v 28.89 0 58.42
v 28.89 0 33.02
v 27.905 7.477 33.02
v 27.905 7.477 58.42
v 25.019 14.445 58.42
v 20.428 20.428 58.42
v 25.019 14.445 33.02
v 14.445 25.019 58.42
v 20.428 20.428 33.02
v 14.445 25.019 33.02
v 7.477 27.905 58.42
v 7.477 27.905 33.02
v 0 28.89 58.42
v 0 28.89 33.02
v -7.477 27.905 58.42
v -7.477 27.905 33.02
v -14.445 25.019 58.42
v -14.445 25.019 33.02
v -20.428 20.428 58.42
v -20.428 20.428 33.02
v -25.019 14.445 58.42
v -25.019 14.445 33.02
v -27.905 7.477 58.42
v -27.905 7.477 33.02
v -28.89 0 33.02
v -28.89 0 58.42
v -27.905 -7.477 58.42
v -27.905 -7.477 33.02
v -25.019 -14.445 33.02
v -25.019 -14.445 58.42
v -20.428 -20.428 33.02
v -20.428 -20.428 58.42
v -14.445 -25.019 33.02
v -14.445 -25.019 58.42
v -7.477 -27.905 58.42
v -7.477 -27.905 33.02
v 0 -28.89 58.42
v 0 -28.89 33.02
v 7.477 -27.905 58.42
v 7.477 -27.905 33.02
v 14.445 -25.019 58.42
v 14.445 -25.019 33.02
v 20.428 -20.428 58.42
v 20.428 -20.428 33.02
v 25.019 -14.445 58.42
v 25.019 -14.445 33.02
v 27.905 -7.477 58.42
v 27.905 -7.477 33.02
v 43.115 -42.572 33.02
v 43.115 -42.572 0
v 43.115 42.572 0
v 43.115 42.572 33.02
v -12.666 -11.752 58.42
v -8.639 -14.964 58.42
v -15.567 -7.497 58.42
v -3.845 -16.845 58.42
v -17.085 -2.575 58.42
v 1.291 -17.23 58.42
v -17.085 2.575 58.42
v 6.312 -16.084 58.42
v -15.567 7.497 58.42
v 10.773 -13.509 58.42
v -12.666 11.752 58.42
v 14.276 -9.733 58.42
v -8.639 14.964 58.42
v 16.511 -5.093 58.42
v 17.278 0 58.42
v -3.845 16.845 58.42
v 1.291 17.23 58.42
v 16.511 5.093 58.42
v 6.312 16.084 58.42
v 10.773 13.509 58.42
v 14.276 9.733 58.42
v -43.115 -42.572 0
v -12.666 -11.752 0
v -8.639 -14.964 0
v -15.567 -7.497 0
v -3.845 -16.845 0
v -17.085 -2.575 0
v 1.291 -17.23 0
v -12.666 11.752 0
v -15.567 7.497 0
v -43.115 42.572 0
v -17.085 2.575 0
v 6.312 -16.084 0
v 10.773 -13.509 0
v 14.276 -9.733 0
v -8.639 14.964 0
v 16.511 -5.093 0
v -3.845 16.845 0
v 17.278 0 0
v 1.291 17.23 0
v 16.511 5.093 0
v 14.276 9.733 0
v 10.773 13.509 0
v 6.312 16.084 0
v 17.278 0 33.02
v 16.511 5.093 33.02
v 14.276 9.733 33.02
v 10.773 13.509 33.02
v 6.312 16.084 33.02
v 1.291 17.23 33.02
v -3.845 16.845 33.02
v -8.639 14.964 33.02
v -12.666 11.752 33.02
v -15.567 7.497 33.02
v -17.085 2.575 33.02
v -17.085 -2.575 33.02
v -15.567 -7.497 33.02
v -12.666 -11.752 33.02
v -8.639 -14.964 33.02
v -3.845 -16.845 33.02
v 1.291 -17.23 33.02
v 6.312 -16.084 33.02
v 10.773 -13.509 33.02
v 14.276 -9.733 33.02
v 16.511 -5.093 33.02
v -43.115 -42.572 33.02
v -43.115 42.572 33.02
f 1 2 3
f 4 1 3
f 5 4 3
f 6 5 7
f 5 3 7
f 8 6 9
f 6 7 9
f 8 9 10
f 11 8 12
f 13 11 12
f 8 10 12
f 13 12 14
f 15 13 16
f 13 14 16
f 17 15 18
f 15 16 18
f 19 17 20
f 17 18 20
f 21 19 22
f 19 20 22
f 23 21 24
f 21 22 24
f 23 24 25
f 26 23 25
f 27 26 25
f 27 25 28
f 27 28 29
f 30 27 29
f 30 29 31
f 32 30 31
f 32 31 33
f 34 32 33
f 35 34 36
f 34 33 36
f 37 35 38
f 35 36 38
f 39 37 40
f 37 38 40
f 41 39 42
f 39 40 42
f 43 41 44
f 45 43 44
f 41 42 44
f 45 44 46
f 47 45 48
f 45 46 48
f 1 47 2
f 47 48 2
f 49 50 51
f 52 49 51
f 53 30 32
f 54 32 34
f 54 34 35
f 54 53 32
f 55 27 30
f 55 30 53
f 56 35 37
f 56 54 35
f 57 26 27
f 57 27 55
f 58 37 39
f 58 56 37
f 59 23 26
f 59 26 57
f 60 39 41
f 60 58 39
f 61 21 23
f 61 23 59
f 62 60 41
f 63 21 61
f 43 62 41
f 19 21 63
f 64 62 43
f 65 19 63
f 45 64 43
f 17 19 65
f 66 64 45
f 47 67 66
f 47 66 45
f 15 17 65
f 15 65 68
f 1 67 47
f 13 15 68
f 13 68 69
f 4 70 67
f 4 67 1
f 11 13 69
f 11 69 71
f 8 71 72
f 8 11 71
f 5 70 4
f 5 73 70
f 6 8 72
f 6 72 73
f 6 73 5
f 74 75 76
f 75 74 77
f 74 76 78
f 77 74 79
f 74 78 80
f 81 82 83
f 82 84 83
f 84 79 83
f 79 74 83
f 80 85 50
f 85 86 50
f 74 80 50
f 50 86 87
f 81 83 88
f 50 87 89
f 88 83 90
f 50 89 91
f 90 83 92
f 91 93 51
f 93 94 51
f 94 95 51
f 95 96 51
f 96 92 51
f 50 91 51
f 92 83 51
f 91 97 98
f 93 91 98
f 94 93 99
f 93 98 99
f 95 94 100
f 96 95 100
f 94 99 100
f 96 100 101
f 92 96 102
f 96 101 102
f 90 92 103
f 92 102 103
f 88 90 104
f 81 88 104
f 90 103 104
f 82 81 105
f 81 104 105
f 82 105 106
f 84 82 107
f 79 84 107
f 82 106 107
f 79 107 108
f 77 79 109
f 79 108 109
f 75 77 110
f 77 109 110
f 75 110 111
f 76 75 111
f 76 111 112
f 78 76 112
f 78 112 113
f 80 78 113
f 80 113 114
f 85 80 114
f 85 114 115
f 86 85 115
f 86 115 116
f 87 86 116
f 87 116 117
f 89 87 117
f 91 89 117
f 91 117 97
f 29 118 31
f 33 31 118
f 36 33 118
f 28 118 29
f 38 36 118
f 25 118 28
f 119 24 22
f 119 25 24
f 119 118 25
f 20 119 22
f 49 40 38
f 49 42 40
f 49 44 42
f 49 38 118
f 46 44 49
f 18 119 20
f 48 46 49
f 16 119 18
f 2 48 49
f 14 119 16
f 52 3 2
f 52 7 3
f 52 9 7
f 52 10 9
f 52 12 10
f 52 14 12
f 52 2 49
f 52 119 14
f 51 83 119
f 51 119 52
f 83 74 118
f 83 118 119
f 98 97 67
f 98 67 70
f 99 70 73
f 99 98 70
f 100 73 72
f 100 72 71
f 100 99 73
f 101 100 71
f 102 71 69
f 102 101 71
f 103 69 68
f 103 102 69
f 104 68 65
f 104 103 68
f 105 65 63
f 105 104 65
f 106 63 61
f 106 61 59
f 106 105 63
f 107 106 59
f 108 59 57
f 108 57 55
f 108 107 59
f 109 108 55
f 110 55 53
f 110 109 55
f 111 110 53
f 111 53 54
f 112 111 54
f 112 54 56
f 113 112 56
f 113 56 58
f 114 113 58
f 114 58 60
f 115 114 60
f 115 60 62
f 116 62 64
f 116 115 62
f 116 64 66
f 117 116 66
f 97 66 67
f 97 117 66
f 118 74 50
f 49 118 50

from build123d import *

# Parameters (mm, degrees)
F0_W      = 86.230226
F0_H      = 85.144274
F1_DEPTH  = 33.02
F2_R      = 28.889637
F2_R_2    = 17.278363
F3_DEPTH  = 25.4
F3_FACE_R = 17.278363
F4_DEPTH  = 127


with BuildPart() as f1:
    # F0 (on Top) → F1 (new body)
    with BuildSketch(Plane.XY):
        Rectangle(F0_W, F0_H)
    extrude(amount=F1_DEPTH)

    # F2 (on face) → F3 (join)
    with BuildSketch(Plane.XY.offset(33.02)):
        Circle(F2_R)
        Circle(F2_R_2, mode=Mode.SUBTRACT)
    extrude(amount=F3_DEPTH)

    # F3_face (on face) → F4 (cut)
    with BuildSketch(Plane.XY.offset(33.02)):
        Circle(F3_FACE_R)
    extrude(amount=-F4_DEPTH, mode=Mode.SUBTRACT)


solid = f1.part
